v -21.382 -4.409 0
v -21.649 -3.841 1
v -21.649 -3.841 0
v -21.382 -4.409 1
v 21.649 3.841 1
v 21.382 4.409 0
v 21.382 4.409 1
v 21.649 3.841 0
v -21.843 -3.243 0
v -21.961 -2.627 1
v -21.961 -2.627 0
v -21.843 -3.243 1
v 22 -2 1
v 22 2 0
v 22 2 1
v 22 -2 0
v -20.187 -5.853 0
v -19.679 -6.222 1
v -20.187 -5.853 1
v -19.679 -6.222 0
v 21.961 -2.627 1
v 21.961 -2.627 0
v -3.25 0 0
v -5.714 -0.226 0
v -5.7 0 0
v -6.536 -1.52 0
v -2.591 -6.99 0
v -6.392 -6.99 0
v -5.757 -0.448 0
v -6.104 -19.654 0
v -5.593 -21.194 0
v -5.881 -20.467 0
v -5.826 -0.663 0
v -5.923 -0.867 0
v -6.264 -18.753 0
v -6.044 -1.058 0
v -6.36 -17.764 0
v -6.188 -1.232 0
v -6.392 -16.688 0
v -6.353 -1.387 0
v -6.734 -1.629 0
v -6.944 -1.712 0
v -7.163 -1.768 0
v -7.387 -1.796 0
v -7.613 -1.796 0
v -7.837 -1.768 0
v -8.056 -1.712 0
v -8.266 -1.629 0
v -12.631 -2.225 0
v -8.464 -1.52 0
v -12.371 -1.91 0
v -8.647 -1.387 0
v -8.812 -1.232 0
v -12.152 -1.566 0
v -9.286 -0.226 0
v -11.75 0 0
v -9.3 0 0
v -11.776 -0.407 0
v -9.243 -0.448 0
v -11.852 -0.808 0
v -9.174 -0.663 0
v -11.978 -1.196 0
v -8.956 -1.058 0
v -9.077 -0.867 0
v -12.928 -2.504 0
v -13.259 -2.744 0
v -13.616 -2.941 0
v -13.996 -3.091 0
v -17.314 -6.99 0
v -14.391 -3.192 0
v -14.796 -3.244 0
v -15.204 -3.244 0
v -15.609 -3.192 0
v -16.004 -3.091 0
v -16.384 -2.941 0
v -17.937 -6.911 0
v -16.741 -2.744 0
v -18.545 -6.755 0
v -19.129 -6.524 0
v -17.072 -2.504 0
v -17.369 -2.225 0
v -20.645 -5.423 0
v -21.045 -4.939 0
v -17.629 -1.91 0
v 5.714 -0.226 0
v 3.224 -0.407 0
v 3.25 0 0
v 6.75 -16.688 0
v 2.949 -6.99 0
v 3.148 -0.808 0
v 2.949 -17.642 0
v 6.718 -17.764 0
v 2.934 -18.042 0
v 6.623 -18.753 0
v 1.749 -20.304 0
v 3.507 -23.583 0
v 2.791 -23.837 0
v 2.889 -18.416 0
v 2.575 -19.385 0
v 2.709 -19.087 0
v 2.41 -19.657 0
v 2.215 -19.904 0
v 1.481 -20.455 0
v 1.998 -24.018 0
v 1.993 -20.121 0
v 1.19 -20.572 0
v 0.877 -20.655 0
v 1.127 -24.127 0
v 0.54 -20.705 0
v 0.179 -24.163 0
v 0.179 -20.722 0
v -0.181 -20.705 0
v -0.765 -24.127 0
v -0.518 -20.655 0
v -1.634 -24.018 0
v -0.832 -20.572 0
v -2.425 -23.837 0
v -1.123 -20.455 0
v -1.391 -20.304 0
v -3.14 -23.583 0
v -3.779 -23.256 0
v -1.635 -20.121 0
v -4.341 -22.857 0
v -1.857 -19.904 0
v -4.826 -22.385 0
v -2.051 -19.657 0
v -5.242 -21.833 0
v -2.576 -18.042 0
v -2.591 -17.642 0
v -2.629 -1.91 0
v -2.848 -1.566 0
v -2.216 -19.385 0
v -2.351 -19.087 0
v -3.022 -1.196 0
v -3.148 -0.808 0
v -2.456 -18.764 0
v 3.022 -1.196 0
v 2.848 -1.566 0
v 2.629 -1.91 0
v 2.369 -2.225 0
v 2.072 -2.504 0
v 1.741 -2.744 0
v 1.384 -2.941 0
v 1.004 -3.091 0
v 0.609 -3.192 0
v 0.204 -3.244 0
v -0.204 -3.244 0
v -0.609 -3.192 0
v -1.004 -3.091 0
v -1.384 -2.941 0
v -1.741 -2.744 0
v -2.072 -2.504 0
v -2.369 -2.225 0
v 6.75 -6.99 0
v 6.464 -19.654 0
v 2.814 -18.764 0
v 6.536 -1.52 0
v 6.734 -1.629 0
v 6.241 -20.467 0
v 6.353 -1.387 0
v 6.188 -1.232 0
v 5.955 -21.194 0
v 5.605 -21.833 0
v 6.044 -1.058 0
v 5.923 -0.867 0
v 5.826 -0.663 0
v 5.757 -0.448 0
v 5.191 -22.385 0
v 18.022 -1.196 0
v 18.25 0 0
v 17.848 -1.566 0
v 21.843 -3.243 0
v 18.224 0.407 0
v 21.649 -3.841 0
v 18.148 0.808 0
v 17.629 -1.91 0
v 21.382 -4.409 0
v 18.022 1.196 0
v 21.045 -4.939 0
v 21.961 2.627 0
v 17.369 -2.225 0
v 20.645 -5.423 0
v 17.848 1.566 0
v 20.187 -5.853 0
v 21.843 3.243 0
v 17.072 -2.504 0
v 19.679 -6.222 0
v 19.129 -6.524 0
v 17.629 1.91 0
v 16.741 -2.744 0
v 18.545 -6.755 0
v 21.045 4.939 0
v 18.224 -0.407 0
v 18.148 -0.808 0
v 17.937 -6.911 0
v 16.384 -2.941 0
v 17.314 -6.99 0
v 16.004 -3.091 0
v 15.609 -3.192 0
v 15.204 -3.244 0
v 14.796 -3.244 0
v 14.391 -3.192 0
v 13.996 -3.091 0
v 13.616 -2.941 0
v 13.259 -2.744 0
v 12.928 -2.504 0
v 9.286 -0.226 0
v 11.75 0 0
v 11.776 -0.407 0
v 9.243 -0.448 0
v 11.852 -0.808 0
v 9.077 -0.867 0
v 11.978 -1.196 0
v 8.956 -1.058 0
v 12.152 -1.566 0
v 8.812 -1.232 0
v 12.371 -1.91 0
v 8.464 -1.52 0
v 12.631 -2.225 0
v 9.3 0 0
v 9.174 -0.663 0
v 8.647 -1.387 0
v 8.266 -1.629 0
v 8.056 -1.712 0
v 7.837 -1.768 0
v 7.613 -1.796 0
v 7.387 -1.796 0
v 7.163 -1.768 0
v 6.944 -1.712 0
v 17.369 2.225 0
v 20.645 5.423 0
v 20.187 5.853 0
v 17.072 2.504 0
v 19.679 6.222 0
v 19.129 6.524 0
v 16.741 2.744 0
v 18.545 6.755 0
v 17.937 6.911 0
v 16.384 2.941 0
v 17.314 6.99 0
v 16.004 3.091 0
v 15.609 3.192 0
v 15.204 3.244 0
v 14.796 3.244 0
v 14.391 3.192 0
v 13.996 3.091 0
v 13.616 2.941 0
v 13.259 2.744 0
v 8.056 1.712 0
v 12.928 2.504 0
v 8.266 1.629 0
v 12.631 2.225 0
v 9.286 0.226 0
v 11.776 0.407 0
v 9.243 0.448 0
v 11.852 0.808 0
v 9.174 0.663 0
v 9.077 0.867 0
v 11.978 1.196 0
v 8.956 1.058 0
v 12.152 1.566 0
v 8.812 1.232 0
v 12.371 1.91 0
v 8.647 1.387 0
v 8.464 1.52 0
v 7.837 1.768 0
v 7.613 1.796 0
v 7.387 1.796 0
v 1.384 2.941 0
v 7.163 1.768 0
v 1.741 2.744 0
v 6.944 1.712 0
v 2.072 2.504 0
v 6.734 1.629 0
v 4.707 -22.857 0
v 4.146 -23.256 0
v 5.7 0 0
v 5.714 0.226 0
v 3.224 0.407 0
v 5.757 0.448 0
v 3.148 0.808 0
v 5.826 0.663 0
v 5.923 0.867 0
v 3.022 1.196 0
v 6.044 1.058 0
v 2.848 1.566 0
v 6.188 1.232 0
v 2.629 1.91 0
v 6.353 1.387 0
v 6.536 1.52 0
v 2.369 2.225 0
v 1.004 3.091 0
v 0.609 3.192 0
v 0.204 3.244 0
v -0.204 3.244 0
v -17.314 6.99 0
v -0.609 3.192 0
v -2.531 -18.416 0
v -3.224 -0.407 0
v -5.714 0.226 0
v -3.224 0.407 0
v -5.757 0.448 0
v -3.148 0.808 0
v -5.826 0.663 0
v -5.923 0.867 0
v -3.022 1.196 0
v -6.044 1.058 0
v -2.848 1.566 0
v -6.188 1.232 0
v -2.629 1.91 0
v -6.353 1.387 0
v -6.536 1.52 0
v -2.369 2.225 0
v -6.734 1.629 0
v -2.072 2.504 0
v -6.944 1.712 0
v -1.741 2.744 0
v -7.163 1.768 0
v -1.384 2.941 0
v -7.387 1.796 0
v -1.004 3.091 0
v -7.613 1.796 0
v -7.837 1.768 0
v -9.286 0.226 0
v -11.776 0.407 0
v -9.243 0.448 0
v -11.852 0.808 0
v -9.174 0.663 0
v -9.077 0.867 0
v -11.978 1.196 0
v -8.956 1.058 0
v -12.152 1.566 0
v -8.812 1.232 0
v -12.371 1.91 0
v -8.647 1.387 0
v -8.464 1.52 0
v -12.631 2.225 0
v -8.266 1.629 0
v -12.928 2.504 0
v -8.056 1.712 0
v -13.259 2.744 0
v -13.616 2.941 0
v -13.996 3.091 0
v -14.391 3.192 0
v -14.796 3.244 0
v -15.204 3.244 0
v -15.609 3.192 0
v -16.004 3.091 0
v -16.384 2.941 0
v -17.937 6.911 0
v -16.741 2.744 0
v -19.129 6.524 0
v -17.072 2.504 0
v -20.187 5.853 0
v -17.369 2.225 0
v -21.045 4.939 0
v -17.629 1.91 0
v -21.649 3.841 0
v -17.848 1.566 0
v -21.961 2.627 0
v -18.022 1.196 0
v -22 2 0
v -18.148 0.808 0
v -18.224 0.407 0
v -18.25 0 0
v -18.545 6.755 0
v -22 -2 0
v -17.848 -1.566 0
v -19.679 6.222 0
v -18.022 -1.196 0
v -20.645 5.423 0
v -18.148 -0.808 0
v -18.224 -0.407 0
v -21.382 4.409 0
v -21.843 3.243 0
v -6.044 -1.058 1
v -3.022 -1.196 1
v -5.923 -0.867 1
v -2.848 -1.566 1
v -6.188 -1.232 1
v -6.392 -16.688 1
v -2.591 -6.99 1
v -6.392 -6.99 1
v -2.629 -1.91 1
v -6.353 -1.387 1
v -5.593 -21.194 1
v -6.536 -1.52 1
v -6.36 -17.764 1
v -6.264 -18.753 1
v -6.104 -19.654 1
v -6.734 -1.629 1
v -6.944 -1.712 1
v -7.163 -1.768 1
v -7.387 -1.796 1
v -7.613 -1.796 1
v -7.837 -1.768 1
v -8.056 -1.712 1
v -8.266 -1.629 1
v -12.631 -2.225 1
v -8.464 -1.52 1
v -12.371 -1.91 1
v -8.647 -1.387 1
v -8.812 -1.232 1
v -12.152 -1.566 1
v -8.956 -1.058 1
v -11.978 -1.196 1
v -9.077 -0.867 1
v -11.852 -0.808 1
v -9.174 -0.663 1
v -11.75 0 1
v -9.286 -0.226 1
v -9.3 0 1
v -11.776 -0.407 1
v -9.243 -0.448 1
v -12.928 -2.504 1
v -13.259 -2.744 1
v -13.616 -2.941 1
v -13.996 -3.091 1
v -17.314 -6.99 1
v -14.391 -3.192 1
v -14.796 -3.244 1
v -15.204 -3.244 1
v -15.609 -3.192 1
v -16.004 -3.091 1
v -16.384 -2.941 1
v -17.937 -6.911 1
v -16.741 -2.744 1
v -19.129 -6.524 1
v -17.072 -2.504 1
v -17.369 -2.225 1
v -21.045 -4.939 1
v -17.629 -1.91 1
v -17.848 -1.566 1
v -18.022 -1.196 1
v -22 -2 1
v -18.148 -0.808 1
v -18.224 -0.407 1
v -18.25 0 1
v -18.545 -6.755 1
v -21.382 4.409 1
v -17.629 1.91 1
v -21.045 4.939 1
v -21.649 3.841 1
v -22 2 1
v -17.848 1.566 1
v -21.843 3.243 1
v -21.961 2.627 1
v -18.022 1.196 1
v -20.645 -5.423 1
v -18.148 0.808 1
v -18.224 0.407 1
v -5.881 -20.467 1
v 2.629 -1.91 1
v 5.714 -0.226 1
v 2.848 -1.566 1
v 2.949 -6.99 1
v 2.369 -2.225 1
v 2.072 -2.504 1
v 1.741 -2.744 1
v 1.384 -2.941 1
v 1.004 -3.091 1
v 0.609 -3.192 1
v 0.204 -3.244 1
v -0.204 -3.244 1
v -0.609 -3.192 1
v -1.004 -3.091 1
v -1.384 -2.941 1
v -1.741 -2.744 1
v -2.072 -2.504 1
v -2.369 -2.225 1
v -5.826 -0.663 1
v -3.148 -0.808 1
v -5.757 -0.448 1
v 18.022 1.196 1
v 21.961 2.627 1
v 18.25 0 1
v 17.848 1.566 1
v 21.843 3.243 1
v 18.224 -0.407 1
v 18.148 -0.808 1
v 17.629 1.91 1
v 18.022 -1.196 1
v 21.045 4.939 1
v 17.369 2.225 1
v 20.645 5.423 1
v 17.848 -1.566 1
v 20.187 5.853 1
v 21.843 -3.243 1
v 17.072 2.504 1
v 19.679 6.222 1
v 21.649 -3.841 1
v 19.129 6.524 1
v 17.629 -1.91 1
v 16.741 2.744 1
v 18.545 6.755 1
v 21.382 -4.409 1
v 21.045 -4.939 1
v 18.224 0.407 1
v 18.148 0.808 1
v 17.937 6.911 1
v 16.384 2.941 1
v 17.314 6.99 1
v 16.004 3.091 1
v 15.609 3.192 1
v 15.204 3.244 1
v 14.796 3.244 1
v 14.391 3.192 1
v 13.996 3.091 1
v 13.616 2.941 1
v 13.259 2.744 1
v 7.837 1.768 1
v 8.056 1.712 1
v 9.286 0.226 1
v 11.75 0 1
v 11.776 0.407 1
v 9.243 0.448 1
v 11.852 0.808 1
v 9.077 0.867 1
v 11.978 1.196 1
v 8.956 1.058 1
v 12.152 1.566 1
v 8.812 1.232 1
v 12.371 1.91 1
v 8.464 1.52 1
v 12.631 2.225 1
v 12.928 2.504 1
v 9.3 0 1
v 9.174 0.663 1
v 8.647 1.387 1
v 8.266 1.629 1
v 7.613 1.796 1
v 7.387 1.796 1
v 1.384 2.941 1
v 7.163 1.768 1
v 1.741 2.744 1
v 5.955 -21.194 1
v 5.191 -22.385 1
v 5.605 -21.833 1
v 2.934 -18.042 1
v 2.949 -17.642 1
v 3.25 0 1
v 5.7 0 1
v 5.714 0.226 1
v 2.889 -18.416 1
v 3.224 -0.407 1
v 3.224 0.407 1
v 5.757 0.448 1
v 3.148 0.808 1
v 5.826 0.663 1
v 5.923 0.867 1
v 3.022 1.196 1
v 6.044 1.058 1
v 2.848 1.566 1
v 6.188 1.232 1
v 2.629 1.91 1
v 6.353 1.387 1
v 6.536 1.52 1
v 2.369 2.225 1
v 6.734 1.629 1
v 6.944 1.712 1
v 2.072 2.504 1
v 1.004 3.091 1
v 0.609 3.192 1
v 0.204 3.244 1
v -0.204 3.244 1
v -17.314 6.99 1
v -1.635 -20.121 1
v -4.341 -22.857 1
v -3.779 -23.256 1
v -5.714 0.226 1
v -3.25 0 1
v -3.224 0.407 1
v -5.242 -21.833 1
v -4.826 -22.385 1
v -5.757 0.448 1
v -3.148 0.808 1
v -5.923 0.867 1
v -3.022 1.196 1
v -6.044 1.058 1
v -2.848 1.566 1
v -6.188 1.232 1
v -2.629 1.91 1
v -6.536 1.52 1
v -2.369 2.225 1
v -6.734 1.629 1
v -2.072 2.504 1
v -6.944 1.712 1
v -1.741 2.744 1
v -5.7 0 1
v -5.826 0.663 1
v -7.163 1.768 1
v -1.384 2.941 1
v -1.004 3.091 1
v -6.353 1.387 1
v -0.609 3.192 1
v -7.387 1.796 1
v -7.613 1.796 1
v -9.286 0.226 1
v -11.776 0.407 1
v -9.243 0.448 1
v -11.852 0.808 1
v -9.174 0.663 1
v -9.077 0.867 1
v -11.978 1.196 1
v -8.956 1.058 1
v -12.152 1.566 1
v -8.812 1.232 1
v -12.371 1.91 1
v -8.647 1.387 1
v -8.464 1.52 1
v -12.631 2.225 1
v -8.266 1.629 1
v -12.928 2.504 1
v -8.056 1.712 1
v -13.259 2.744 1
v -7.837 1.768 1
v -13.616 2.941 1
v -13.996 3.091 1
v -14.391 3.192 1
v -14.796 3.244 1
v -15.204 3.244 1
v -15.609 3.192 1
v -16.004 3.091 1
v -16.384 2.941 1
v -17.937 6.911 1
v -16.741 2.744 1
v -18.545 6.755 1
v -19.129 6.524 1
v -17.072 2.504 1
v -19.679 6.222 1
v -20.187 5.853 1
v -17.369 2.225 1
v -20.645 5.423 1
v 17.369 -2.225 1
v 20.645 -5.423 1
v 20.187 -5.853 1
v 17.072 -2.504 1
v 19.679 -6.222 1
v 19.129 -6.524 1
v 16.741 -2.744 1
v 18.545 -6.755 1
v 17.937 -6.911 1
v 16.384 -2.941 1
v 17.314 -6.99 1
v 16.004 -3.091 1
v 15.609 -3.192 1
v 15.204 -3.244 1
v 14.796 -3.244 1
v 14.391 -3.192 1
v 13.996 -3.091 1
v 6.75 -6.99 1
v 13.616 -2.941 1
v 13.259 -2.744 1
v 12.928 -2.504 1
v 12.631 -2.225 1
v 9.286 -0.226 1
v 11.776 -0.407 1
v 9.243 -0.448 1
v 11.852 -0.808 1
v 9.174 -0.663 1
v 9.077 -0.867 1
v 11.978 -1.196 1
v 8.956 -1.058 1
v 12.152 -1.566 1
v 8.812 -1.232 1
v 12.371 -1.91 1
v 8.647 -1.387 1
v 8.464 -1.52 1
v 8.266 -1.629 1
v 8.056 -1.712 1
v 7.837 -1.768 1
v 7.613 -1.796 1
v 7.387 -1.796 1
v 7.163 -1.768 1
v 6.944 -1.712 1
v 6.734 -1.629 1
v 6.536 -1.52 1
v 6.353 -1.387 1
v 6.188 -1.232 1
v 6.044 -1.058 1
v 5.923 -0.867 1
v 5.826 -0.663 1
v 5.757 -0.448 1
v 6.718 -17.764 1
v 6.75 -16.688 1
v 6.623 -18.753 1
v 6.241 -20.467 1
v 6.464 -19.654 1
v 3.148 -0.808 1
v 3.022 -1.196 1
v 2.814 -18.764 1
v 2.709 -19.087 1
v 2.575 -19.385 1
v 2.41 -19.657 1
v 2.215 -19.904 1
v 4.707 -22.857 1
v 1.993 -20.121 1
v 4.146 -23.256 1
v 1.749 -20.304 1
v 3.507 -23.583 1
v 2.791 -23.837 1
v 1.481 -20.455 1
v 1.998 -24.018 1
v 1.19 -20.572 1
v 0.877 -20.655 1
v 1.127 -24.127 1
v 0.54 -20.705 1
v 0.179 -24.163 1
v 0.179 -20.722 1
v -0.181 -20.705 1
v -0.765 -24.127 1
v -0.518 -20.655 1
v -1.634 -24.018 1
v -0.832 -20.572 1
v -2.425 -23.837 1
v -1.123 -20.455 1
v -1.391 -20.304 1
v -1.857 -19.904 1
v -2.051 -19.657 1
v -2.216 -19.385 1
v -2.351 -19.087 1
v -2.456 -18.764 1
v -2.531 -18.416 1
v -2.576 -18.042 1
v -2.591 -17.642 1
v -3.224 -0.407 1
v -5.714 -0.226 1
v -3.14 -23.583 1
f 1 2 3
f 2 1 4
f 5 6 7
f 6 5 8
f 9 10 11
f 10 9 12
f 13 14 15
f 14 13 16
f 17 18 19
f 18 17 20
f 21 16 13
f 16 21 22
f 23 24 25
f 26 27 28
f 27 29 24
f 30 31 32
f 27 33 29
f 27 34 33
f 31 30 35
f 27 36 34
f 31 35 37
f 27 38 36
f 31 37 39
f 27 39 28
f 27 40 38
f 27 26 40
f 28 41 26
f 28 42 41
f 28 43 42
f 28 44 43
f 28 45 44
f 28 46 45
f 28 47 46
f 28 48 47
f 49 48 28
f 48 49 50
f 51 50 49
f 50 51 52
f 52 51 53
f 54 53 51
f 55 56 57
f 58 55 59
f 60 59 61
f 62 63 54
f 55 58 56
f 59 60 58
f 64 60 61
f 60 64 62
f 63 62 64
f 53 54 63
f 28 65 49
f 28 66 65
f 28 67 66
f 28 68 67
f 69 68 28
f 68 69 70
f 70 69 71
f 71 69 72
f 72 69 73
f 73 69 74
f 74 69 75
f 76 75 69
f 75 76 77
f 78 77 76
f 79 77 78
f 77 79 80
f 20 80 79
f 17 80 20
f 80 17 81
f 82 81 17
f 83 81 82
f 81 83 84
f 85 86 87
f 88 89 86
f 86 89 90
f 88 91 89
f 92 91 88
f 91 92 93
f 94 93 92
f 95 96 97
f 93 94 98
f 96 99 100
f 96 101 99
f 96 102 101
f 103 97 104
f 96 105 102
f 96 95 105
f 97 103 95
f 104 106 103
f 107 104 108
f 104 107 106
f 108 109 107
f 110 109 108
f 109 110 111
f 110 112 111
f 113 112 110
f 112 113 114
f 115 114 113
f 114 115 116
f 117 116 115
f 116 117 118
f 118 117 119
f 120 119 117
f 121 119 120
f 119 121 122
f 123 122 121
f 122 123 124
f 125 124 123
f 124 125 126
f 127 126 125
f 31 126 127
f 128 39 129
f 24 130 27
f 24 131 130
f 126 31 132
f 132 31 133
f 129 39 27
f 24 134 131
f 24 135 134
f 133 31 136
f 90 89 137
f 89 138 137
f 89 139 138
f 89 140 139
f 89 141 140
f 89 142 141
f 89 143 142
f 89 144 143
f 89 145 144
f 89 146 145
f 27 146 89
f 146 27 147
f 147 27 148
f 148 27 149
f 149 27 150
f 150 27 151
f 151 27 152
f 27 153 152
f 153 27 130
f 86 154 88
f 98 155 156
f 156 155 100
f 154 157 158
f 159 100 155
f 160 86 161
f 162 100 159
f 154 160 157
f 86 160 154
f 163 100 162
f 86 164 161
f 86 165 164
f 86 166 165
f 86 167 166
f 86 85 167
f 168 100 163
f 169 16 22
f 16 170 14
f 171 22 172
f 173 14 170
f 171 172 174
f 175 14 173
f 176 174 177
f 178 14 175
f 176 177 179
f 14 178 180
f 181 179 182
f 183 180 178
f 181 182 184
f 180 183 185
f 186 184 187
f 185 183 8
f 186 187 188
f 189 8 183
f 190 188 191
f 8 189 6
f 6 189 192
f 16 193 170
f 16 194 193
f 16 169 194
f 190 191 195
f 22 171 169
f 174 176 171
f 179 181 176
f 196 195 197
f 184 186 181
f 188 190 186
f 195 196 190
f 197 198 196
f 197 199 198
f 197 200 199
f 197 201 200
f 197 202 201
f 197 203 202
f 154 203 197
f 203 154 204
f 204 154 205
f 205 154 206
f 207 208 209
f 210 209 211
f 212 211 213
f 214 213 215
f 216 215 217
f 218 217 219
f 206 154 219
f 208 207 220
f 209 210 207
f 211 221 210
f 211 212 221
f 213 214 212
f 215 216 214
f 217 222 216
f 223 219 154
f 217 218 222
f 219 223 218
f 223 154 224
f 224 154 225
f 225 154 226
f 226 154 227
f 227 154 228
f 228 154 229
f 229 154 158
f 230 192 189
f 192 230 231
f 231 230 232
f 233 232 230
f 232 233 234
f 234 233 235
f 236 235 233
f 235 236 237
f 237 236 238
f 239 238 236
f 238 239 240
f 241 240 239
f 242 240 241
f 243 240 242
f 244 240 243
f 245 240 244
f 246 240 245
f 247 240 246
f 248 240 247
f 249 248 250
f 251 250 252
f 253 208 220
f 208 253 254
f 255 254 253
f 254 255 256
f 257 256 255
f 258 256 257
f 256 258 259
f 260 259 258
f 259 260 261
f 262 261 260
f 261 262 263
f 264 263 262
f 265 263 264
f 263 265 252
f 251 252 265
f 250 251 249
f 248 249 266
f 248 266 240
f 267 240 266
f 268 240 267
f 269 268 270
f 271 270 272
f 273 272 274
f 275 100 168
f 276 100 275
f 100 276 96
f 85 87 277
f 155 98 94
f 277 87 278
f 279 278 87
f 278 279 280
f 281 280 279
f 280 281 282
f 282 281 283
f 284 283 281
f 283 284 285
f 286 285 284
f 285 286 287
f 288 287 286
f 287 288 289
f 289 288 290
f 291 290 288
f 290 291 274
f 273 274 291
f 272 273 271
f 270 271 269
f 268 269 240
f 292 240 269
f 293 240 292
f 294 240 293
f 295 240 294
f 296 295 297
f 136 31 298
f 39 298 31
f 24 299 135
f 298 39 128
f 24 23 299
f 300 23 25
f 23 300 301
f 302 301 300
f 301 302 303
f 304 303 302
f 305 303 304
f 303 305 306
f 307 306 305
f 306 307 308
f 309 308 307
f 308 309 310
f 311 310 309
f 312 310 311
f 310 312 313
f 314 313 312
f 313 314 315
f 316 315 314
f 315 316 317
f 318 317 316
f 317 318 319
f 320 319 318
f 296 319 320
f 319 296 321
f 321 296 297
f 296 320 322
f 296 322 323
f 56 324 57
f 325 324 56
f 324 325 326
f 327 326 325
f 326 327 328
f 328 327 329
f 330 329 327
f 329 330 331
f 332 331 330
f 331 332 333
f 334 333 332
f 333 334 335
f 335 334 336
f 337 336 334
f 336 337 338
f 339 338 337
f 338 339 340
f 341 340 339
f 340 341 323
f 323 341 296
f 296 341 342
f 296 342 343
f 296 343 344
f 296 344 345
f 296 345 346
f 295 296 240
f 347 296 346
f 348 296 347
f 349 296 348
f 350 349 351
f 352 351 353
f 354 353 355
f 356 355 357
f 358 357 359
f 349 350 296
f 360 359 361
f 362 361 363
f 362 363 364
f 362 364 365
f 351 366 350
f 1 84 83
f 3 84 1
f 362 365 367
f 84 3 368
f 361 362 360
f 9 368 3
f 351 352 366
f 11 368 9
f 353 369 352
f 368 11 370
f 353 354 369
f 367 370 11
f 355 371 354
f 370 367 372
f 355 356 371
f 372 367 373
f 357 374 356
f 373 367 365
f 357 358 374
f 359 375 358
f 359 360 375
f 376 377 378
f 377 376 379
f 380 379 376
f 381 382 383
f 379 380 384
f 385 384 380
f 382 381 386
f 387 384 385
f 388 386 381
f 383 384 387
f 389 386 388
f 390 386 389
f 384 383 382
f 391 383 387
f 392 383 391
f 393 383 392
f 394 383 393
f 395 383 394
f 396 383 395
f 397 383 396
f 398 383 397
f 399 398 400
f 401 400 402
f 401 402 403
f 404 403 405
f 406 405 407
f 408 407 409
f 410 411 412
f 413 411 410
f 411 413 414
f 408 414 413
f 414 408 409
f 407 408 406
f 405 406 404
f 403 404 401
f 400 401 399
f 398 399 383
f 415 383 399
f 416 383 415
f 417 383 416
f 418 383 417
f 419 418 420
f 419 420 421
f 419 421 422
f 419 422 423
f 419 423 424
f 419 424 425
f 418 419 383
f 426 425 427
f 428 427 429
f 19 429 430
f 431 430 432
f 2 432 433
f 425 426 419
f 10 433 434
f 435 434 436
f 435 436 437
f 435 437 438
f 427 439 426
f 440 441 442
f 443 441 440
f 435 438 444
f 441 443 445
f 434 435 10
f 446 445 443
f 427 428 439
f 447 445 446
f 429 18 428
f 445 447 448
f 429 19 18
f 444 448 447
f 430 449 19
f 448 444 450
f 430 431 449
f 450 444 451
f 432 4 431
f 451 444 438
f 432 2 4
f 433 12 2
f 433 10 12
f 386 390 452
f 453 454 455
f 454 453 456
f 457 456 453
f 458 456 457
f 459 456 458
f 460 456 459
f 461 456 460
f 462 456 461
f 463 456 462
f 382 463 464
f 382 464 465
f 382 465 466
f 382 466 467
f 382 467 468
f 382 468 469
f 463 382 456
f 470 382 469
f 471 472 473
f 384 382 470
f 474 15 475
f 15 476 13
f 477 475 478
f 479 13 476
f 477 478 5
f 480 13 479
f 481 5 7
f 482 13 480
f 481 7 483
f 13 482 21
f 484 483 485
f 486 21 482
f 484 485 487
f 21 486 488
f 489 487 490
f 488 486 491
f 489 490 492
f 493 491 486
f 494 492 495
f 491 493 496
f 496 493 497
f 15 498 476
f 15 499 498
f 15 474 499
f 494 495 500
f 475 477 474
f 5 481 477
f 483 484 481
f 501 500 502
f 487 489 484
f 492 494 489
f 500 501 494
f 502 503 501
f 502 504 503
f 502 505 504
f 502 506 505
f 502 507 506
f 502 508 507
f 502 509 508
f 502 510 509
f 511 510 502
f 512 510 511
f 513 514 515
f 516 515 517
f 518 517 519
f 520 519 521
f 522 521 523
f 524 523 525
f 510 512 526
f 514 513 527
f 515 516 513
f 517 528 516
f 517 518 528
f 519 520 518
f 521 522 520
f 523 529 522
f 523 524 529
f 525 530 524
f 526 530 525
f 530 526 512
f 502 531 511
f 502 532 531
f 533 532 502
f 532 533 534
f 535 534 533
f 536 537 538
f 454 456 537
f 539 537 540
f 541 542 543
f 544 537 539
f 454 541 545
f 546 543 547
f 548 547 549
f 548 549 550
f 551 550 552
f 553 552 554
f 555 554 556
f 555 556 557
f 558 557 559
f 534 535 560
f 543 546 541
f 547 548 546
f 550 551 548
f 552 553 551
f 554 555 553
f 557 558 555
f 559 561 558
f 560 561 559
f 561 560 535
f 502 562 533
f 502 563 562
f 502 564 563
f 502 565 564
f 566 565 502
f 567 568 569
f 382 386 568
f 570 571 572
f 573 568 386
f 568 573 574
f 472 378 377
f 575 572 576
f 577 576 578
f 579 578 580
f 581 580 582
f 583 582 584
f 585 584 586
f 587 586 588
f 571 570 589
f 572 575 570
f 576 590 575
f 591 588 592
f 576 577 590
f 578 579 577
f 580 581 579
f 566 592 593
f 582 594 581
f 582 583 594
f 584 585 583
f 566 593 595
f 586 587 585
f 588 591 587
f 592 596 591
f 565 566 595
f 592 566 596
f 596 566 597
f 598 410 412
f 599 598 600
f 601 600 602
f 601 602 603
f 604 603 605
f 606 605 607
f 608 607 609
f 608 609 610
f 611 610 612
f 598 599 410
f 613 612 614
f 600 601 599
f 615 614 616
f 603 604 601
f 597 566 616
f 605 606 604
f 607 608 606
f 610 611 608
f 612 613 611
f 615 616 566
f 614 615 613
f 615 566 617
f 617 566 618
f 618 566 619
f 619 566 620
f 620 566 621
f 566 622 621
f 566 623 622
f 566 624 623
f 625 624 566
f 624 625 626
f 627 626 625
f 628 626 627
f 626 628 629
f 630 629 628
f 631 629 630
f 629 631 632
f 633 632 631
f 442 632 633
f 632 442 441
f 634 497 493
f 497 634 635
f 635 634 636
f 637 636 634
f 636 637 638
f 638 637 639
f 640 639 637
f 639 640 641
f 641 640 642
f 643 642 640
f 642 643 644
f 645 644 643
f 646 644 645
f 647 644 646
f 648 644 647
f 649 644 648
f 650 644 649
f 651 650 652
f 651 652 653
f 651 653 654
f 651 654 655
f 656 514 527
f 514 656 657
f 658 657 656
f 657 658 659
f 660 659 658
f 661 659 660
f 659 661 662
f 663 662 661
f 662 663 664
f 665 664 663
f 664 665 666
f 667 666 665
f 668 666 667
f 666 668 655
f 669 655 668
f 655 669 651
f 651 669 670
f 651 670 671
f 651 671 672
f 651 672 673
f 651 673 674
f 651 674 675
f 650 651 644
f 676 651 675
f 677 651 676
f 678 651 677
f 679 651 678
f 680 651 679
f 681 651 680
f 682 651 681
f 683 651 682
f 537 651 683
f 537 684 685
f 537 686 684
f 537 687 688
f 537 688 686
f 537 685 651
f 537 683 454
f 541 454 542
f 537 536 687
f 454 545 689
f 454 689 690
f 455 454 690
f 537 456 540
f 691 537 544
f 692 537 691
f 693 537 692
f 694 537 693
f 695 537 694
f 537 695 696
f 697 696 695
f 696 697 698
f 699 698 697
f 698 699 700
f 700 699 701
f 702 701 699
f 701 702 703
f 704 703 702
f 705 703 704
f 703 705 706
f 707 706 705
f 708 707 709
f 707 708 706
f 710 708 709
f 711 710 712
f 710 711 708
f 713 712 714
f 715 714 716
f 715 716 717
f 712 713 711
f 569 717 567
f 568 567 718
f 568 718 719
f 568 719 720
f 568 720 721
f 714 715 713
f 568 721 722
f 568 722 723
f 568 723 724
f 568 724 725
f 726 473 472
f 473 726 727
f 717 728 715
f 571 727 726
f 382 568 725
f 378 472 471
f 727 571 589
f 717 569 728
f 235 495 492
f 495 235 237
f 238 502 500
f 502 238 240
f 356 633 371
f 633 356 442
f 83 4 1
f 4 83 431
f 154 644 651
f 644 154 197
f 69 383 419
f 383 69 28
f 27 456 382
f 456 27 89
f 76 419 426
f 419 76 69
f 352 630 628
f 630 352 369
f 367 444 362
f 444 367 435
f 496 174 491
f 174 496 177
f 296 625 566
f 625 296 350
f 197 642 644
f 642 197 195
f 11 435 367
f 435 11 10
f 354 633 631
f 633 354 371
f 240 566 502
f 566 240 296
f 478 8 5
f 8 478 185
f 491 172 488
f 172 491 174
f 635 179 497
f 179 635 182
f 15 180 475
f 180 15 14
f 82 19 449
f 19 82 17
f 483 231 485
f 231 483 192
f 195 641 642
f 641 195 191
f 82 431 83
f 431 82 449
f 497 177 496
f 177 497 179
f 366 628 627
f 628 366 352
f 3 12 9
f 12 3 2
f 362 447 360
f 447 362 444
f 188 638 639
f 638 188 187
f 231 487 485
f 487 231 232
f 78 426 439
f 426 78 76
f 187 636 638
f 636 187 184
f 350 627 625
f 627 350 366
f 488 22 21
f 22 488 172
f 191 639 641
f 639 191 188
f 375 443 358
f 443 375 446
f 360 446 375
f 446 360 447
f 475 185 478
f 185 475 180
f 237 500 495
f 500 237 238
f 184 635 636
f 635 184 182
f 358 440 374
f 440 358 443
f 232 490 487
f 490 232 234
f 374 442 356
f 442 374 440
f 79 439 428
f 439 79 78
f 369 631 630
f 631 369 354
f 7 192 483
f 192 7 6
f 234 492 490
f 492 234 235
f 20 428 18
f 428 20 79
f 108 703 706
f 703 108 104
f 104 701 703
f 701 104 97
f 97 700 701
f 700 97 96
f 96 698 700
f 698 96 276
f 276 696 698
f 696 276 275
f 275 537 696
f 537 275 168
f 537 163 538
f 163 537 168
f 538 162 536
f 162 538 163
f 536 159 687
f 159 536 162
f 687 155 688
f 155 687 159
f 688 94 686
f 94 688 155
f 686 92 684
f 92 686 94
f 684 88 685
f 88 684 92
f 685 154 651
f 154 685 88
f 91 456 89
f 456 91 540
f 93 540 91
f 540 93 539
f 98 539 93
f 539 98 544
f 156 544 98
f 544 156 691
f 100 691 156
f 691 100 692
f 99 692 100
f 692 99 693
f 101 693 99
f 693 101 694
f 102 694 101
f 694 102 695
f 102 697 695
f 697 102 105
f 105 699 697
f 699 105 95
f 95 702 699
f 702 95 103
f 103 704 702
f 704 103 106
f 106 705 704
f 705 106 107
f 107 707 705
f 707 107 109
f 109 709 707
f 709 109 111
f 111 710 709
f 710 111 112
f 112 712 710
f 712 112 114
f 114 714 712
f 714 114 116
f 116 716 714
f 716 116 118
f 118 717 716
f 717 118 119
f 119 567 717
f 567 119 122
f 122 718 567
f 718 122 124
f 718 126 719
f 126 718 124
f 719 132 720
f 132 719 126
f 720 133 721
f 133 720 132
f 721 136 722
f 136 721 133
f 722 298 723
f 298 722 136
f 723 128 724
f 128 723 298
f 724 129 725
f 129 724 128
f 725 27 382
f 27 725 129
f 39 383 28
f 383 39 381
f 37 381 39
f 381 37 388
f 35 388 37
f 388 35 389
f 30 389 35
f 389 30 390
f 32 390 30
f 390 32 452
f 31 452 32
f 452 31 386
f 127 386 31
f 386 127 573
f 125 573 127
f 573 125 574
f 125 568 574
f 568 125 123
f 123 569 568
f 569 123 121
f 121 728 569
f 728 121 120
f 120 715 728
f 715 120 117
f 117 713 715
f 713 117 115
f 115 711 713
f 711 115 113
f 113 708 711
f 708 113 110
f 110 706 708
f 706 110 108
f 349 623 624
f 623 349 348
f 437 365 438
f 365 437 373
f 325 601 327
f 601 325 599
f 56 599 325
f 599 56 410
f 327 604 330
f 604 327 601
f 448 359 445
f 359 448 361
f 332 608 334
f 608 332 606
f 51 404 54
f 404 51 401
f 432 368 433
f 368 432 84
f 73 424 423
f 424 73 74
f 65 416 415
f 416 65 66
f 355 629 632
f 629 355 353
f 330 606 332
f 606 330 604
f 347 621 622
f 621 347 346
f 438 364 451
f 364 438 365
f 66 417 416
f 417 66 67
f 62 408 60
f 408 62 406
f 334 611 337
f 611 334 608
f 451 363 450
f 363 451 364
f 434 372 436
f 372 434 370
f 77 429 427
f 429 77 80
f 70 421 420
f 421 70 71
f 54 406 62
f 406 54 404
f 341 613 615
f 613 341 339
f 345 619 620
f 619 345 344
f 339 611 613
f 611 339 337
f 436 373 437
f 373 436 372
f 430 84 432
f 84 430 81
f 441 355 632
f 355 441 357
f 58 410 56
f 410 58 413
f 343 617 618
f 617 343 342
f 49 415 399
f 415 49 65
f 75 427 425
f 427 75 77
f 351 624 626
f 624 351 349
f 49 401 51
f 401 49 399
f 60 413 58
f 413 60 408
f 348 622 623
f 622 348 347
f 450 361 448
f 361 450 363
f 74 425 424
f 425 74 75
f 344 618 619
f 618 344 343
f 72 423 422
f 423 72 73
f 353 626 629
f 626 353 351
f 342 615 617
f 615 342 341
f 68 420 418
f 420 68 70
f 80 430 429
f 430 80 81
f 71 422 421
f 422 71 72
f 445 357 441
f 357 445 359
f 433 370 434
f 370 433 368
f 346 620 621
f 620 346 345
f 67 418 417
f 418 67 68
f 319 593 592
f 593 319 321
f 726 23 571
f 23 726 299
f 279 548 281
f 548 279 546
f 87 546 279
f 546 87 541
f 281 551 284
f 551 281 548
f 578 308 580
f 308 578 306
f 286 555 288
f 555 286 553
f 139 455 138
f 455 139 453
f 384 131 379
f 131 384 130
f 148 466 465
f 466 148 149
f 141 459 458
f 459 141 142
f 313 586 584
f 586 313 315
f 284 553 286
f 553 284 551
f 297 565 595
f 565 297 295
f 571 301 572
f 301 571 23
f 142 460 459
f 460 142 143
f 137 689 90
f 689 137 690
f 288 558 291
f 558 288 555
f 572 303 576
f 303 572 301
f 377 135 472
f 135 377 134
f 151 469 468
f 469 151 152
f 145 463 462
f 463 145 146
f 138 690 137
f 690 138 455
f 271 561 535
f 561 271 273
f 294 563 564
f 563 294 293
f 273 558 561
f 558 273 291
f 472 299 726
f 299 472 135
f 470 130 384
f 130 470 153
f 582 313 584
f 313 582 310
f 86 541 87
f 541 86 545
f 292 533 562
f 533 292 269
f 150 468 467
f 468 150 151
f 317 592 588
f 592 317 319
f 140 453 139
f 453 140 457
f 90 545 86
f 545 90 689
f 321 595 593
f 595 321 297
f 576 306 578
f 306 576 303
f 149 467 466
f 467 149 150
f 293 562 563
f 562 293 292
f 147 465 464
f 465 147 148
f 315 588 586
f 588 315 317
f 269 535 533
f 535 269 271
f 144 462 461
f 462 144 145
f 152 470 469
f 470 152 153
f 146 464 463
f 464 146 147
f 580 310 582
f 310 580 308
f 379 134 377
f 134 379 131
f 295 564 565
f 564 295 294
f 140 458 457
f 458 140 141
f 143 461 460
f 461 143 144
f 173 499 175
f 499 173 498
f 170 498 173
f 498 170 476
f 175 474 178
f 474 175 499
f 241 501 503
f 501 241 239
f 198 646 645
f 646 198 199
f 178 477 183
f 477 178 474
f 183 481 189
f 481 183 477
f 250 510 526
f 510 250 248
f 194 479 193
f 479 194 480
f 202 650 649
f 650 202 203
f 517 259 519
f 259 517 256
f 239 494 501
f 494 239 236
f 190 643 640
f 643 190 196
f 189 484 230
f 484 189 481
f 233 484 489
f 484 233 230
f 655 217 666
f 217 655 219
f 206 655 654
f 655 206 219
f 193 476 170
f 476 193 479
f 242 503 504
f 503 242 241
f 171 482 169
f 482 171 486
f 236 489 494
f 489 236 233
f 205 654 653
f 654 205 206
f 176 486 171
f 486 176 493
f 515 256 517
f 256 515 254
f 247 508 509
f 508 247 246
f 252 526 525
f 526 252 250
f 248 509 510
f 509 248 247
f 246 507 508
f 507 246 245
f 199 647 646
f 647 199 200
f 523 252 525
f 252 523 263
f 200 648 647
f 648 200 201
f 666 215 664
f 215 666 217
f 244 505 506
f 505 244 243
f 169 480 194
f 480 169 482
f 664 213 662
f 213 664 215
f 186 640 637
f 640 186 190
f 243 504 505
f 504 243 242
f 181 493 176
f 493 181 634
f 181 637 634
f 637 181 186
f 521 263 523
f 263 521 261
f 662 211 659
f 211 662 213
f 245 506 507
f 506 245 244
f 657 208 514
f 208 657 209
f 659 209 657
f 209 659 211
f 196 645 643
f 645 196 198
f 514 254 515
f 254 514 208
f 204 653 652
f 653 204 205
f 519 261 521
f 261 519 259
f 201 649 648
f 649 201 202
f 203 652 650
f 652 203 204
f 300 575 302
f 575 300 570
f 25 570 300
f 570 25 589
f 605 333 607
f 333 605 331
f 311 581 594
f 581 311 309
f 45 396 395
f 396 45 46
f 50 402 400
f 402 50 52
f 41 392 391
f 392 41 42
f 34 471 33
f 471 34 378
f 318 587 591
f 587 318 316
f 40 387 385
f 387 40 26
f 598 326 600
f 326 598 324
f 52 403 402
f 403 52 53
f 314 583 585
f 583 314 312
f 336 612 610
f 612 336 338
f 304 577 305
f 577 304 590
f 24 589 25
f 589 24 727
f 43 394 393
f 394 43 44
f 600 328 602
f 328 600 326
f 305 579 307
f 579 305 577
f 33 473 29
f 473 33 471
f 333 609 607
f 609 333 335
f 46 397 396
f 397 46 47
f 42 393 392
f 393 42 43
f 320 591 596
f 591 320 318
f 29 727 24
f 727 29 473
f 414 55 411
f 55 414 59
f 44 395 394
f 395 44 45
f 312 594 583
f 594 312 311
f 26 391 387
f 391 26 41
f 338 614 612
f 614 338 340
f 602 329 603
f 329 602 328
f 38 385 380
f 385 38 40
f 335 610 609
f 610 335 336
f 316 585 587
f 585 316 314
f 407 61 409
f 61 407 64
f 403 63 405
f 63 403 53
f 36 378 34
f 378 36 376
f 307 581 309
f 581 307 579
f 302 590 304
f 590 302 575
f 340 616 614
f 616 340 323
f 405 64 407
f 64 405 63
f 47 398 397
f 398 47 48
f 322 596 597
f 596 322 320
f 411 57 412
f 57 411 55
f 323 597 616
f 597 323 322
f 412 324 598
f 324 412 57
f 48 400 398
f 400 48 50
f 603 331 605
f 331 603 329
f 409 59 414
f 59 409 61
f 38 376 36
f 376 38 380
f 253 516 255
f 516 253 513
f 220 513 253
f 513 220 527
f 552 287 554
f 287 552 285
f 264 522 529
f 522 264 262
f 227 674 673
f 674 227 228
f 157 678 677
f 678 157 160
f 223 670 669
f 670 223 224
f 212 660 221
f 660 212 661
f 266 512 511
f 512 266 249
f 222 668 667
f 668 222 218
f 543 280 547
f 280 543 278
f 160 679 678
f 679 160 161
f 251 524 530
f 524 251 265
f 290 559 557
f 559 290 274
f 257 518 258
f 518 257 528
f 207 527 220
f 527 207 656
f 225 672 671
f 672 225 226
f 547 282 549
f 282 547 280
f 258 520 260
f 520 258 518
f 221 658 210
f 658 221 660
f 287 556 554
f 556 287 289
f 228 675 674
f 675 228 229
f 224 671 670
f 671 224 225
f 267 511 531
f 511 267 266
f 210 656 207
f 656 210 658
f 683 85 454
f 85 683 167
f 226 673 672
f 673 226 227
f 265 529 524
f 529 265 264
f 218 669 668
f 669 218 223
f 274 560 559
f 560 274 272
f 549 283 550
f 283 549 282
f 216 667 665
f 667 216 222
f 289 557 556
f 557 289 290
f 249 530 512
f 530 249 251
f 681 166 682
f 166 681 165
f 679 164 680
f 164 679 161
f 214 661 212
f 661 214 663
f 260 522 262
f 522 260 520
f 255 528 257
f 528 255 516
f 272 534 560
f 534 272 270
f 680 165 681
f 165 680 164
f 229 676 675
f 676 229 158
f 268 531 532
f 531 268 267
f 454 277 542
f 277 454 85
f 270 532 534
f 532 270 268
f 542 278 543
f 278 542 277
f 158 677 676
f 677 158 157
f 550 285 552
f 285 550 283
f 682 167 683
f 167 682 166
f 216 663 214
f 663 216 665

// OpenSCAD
$fn = 50;


difference() {
	union() {
		*color(alpha = 1.0000000000, c = "gray") {
			translate(v = [0, 14, 0]) {
				linear_extrude(height = 1) {
					text(font = "Arial:style=Bold", halign = "center", size = 4.5000000000, text = "COMMENT description oobb_plate_shape_p_type_1_depth_3_width_1_thickness_u_extra_oobb_size", valign = "center");
				}
			}
		}
		hull() {
			translate(v = [-17.0000000000, 2.0000000000, 0]) {
				cylinder(h = 1, r = 5);
			}
			translate(v = [17.0000000000, 2.0000000000, 0]) {
				cylinder(h = 1, r = 5);
			}
			translate(v = [-17.0000000000, -2.0000000000, 0]) {
				cylinder(h = 1, r = 5);
			}
			translate(v = [17.0000000000, -2.0000000000, 0]) {
				cylinder(h = 1, r = 5);
			}
		}
		translate(v = [0, -5, 0]) {
			linear_extrude(height = 1) {
				text(font = "DejaVu Sans Mono:style=Bold", halign = "center", size = 19.0000000000, text = "U", valign = "top");
			}
		}
	}
	union() {
		*color(alpha = 1.0000000000, c = "gray") {
			translate(v = [0, 14, 0]) {
				linear_extrude(height = 1) {
					text(font = "Arial:style=Bold", halign = "center", size = 4.5000000000, text = "COMMENT description oobb_holes_shape_n_type_3_width_1_thickness_u_extra_oobb_size_1_height_'all'_holes_true_both_holes", valign = "center");
				}
			}
		}
		translate(v = [-15.0000000000, 0.0000000000, 0]) {
			translate(v = [0, 0, -50]) {
				cylinder(h = 100, r = 3.2500000000);
			}
		}
		translate(v = [0, 0, -50]) {
			cylinder(h = 100, r = 3.2500000000);
		}
		translate(v = [15.0000000000, 0.0000000000, 0]) {
			translate(v = [0, 0, -50]) {
				cylinder(h = 100, r = 3.2500000000);
			}
		}
		translate(v = [-15.0000000000, 0.0000000000, 0]) {
			translate(v = [0, 0, -50]) {
				cylinder(h = 100, r = 1.8000000000);
			}
		}
		translate(v = [-7.5000000000, 0.0000000000, 0]) {
			translate(v = [0, 0, -50]) {
				cylinder(h = 100, r = 1.8000000000);
			}
		}
		translate(v = [0, 0, -50]) {
			cylinder(h = 100, r = 1.8000000000);
		}
		translate(v = [7.5000000000, 0.0000000000, 0]) {
			translate(v = [0, 0, -50]) {
				cylinder(h = 100, r = 1.8000000000);
			}
		}
		translate(v = [15.0000000000, 0.0000000000, 0]) {
			translate(v = [0, 0, -50]) {
				cylinder(h = 100, r = 1.8000000000);
			}
		}
	}
}
